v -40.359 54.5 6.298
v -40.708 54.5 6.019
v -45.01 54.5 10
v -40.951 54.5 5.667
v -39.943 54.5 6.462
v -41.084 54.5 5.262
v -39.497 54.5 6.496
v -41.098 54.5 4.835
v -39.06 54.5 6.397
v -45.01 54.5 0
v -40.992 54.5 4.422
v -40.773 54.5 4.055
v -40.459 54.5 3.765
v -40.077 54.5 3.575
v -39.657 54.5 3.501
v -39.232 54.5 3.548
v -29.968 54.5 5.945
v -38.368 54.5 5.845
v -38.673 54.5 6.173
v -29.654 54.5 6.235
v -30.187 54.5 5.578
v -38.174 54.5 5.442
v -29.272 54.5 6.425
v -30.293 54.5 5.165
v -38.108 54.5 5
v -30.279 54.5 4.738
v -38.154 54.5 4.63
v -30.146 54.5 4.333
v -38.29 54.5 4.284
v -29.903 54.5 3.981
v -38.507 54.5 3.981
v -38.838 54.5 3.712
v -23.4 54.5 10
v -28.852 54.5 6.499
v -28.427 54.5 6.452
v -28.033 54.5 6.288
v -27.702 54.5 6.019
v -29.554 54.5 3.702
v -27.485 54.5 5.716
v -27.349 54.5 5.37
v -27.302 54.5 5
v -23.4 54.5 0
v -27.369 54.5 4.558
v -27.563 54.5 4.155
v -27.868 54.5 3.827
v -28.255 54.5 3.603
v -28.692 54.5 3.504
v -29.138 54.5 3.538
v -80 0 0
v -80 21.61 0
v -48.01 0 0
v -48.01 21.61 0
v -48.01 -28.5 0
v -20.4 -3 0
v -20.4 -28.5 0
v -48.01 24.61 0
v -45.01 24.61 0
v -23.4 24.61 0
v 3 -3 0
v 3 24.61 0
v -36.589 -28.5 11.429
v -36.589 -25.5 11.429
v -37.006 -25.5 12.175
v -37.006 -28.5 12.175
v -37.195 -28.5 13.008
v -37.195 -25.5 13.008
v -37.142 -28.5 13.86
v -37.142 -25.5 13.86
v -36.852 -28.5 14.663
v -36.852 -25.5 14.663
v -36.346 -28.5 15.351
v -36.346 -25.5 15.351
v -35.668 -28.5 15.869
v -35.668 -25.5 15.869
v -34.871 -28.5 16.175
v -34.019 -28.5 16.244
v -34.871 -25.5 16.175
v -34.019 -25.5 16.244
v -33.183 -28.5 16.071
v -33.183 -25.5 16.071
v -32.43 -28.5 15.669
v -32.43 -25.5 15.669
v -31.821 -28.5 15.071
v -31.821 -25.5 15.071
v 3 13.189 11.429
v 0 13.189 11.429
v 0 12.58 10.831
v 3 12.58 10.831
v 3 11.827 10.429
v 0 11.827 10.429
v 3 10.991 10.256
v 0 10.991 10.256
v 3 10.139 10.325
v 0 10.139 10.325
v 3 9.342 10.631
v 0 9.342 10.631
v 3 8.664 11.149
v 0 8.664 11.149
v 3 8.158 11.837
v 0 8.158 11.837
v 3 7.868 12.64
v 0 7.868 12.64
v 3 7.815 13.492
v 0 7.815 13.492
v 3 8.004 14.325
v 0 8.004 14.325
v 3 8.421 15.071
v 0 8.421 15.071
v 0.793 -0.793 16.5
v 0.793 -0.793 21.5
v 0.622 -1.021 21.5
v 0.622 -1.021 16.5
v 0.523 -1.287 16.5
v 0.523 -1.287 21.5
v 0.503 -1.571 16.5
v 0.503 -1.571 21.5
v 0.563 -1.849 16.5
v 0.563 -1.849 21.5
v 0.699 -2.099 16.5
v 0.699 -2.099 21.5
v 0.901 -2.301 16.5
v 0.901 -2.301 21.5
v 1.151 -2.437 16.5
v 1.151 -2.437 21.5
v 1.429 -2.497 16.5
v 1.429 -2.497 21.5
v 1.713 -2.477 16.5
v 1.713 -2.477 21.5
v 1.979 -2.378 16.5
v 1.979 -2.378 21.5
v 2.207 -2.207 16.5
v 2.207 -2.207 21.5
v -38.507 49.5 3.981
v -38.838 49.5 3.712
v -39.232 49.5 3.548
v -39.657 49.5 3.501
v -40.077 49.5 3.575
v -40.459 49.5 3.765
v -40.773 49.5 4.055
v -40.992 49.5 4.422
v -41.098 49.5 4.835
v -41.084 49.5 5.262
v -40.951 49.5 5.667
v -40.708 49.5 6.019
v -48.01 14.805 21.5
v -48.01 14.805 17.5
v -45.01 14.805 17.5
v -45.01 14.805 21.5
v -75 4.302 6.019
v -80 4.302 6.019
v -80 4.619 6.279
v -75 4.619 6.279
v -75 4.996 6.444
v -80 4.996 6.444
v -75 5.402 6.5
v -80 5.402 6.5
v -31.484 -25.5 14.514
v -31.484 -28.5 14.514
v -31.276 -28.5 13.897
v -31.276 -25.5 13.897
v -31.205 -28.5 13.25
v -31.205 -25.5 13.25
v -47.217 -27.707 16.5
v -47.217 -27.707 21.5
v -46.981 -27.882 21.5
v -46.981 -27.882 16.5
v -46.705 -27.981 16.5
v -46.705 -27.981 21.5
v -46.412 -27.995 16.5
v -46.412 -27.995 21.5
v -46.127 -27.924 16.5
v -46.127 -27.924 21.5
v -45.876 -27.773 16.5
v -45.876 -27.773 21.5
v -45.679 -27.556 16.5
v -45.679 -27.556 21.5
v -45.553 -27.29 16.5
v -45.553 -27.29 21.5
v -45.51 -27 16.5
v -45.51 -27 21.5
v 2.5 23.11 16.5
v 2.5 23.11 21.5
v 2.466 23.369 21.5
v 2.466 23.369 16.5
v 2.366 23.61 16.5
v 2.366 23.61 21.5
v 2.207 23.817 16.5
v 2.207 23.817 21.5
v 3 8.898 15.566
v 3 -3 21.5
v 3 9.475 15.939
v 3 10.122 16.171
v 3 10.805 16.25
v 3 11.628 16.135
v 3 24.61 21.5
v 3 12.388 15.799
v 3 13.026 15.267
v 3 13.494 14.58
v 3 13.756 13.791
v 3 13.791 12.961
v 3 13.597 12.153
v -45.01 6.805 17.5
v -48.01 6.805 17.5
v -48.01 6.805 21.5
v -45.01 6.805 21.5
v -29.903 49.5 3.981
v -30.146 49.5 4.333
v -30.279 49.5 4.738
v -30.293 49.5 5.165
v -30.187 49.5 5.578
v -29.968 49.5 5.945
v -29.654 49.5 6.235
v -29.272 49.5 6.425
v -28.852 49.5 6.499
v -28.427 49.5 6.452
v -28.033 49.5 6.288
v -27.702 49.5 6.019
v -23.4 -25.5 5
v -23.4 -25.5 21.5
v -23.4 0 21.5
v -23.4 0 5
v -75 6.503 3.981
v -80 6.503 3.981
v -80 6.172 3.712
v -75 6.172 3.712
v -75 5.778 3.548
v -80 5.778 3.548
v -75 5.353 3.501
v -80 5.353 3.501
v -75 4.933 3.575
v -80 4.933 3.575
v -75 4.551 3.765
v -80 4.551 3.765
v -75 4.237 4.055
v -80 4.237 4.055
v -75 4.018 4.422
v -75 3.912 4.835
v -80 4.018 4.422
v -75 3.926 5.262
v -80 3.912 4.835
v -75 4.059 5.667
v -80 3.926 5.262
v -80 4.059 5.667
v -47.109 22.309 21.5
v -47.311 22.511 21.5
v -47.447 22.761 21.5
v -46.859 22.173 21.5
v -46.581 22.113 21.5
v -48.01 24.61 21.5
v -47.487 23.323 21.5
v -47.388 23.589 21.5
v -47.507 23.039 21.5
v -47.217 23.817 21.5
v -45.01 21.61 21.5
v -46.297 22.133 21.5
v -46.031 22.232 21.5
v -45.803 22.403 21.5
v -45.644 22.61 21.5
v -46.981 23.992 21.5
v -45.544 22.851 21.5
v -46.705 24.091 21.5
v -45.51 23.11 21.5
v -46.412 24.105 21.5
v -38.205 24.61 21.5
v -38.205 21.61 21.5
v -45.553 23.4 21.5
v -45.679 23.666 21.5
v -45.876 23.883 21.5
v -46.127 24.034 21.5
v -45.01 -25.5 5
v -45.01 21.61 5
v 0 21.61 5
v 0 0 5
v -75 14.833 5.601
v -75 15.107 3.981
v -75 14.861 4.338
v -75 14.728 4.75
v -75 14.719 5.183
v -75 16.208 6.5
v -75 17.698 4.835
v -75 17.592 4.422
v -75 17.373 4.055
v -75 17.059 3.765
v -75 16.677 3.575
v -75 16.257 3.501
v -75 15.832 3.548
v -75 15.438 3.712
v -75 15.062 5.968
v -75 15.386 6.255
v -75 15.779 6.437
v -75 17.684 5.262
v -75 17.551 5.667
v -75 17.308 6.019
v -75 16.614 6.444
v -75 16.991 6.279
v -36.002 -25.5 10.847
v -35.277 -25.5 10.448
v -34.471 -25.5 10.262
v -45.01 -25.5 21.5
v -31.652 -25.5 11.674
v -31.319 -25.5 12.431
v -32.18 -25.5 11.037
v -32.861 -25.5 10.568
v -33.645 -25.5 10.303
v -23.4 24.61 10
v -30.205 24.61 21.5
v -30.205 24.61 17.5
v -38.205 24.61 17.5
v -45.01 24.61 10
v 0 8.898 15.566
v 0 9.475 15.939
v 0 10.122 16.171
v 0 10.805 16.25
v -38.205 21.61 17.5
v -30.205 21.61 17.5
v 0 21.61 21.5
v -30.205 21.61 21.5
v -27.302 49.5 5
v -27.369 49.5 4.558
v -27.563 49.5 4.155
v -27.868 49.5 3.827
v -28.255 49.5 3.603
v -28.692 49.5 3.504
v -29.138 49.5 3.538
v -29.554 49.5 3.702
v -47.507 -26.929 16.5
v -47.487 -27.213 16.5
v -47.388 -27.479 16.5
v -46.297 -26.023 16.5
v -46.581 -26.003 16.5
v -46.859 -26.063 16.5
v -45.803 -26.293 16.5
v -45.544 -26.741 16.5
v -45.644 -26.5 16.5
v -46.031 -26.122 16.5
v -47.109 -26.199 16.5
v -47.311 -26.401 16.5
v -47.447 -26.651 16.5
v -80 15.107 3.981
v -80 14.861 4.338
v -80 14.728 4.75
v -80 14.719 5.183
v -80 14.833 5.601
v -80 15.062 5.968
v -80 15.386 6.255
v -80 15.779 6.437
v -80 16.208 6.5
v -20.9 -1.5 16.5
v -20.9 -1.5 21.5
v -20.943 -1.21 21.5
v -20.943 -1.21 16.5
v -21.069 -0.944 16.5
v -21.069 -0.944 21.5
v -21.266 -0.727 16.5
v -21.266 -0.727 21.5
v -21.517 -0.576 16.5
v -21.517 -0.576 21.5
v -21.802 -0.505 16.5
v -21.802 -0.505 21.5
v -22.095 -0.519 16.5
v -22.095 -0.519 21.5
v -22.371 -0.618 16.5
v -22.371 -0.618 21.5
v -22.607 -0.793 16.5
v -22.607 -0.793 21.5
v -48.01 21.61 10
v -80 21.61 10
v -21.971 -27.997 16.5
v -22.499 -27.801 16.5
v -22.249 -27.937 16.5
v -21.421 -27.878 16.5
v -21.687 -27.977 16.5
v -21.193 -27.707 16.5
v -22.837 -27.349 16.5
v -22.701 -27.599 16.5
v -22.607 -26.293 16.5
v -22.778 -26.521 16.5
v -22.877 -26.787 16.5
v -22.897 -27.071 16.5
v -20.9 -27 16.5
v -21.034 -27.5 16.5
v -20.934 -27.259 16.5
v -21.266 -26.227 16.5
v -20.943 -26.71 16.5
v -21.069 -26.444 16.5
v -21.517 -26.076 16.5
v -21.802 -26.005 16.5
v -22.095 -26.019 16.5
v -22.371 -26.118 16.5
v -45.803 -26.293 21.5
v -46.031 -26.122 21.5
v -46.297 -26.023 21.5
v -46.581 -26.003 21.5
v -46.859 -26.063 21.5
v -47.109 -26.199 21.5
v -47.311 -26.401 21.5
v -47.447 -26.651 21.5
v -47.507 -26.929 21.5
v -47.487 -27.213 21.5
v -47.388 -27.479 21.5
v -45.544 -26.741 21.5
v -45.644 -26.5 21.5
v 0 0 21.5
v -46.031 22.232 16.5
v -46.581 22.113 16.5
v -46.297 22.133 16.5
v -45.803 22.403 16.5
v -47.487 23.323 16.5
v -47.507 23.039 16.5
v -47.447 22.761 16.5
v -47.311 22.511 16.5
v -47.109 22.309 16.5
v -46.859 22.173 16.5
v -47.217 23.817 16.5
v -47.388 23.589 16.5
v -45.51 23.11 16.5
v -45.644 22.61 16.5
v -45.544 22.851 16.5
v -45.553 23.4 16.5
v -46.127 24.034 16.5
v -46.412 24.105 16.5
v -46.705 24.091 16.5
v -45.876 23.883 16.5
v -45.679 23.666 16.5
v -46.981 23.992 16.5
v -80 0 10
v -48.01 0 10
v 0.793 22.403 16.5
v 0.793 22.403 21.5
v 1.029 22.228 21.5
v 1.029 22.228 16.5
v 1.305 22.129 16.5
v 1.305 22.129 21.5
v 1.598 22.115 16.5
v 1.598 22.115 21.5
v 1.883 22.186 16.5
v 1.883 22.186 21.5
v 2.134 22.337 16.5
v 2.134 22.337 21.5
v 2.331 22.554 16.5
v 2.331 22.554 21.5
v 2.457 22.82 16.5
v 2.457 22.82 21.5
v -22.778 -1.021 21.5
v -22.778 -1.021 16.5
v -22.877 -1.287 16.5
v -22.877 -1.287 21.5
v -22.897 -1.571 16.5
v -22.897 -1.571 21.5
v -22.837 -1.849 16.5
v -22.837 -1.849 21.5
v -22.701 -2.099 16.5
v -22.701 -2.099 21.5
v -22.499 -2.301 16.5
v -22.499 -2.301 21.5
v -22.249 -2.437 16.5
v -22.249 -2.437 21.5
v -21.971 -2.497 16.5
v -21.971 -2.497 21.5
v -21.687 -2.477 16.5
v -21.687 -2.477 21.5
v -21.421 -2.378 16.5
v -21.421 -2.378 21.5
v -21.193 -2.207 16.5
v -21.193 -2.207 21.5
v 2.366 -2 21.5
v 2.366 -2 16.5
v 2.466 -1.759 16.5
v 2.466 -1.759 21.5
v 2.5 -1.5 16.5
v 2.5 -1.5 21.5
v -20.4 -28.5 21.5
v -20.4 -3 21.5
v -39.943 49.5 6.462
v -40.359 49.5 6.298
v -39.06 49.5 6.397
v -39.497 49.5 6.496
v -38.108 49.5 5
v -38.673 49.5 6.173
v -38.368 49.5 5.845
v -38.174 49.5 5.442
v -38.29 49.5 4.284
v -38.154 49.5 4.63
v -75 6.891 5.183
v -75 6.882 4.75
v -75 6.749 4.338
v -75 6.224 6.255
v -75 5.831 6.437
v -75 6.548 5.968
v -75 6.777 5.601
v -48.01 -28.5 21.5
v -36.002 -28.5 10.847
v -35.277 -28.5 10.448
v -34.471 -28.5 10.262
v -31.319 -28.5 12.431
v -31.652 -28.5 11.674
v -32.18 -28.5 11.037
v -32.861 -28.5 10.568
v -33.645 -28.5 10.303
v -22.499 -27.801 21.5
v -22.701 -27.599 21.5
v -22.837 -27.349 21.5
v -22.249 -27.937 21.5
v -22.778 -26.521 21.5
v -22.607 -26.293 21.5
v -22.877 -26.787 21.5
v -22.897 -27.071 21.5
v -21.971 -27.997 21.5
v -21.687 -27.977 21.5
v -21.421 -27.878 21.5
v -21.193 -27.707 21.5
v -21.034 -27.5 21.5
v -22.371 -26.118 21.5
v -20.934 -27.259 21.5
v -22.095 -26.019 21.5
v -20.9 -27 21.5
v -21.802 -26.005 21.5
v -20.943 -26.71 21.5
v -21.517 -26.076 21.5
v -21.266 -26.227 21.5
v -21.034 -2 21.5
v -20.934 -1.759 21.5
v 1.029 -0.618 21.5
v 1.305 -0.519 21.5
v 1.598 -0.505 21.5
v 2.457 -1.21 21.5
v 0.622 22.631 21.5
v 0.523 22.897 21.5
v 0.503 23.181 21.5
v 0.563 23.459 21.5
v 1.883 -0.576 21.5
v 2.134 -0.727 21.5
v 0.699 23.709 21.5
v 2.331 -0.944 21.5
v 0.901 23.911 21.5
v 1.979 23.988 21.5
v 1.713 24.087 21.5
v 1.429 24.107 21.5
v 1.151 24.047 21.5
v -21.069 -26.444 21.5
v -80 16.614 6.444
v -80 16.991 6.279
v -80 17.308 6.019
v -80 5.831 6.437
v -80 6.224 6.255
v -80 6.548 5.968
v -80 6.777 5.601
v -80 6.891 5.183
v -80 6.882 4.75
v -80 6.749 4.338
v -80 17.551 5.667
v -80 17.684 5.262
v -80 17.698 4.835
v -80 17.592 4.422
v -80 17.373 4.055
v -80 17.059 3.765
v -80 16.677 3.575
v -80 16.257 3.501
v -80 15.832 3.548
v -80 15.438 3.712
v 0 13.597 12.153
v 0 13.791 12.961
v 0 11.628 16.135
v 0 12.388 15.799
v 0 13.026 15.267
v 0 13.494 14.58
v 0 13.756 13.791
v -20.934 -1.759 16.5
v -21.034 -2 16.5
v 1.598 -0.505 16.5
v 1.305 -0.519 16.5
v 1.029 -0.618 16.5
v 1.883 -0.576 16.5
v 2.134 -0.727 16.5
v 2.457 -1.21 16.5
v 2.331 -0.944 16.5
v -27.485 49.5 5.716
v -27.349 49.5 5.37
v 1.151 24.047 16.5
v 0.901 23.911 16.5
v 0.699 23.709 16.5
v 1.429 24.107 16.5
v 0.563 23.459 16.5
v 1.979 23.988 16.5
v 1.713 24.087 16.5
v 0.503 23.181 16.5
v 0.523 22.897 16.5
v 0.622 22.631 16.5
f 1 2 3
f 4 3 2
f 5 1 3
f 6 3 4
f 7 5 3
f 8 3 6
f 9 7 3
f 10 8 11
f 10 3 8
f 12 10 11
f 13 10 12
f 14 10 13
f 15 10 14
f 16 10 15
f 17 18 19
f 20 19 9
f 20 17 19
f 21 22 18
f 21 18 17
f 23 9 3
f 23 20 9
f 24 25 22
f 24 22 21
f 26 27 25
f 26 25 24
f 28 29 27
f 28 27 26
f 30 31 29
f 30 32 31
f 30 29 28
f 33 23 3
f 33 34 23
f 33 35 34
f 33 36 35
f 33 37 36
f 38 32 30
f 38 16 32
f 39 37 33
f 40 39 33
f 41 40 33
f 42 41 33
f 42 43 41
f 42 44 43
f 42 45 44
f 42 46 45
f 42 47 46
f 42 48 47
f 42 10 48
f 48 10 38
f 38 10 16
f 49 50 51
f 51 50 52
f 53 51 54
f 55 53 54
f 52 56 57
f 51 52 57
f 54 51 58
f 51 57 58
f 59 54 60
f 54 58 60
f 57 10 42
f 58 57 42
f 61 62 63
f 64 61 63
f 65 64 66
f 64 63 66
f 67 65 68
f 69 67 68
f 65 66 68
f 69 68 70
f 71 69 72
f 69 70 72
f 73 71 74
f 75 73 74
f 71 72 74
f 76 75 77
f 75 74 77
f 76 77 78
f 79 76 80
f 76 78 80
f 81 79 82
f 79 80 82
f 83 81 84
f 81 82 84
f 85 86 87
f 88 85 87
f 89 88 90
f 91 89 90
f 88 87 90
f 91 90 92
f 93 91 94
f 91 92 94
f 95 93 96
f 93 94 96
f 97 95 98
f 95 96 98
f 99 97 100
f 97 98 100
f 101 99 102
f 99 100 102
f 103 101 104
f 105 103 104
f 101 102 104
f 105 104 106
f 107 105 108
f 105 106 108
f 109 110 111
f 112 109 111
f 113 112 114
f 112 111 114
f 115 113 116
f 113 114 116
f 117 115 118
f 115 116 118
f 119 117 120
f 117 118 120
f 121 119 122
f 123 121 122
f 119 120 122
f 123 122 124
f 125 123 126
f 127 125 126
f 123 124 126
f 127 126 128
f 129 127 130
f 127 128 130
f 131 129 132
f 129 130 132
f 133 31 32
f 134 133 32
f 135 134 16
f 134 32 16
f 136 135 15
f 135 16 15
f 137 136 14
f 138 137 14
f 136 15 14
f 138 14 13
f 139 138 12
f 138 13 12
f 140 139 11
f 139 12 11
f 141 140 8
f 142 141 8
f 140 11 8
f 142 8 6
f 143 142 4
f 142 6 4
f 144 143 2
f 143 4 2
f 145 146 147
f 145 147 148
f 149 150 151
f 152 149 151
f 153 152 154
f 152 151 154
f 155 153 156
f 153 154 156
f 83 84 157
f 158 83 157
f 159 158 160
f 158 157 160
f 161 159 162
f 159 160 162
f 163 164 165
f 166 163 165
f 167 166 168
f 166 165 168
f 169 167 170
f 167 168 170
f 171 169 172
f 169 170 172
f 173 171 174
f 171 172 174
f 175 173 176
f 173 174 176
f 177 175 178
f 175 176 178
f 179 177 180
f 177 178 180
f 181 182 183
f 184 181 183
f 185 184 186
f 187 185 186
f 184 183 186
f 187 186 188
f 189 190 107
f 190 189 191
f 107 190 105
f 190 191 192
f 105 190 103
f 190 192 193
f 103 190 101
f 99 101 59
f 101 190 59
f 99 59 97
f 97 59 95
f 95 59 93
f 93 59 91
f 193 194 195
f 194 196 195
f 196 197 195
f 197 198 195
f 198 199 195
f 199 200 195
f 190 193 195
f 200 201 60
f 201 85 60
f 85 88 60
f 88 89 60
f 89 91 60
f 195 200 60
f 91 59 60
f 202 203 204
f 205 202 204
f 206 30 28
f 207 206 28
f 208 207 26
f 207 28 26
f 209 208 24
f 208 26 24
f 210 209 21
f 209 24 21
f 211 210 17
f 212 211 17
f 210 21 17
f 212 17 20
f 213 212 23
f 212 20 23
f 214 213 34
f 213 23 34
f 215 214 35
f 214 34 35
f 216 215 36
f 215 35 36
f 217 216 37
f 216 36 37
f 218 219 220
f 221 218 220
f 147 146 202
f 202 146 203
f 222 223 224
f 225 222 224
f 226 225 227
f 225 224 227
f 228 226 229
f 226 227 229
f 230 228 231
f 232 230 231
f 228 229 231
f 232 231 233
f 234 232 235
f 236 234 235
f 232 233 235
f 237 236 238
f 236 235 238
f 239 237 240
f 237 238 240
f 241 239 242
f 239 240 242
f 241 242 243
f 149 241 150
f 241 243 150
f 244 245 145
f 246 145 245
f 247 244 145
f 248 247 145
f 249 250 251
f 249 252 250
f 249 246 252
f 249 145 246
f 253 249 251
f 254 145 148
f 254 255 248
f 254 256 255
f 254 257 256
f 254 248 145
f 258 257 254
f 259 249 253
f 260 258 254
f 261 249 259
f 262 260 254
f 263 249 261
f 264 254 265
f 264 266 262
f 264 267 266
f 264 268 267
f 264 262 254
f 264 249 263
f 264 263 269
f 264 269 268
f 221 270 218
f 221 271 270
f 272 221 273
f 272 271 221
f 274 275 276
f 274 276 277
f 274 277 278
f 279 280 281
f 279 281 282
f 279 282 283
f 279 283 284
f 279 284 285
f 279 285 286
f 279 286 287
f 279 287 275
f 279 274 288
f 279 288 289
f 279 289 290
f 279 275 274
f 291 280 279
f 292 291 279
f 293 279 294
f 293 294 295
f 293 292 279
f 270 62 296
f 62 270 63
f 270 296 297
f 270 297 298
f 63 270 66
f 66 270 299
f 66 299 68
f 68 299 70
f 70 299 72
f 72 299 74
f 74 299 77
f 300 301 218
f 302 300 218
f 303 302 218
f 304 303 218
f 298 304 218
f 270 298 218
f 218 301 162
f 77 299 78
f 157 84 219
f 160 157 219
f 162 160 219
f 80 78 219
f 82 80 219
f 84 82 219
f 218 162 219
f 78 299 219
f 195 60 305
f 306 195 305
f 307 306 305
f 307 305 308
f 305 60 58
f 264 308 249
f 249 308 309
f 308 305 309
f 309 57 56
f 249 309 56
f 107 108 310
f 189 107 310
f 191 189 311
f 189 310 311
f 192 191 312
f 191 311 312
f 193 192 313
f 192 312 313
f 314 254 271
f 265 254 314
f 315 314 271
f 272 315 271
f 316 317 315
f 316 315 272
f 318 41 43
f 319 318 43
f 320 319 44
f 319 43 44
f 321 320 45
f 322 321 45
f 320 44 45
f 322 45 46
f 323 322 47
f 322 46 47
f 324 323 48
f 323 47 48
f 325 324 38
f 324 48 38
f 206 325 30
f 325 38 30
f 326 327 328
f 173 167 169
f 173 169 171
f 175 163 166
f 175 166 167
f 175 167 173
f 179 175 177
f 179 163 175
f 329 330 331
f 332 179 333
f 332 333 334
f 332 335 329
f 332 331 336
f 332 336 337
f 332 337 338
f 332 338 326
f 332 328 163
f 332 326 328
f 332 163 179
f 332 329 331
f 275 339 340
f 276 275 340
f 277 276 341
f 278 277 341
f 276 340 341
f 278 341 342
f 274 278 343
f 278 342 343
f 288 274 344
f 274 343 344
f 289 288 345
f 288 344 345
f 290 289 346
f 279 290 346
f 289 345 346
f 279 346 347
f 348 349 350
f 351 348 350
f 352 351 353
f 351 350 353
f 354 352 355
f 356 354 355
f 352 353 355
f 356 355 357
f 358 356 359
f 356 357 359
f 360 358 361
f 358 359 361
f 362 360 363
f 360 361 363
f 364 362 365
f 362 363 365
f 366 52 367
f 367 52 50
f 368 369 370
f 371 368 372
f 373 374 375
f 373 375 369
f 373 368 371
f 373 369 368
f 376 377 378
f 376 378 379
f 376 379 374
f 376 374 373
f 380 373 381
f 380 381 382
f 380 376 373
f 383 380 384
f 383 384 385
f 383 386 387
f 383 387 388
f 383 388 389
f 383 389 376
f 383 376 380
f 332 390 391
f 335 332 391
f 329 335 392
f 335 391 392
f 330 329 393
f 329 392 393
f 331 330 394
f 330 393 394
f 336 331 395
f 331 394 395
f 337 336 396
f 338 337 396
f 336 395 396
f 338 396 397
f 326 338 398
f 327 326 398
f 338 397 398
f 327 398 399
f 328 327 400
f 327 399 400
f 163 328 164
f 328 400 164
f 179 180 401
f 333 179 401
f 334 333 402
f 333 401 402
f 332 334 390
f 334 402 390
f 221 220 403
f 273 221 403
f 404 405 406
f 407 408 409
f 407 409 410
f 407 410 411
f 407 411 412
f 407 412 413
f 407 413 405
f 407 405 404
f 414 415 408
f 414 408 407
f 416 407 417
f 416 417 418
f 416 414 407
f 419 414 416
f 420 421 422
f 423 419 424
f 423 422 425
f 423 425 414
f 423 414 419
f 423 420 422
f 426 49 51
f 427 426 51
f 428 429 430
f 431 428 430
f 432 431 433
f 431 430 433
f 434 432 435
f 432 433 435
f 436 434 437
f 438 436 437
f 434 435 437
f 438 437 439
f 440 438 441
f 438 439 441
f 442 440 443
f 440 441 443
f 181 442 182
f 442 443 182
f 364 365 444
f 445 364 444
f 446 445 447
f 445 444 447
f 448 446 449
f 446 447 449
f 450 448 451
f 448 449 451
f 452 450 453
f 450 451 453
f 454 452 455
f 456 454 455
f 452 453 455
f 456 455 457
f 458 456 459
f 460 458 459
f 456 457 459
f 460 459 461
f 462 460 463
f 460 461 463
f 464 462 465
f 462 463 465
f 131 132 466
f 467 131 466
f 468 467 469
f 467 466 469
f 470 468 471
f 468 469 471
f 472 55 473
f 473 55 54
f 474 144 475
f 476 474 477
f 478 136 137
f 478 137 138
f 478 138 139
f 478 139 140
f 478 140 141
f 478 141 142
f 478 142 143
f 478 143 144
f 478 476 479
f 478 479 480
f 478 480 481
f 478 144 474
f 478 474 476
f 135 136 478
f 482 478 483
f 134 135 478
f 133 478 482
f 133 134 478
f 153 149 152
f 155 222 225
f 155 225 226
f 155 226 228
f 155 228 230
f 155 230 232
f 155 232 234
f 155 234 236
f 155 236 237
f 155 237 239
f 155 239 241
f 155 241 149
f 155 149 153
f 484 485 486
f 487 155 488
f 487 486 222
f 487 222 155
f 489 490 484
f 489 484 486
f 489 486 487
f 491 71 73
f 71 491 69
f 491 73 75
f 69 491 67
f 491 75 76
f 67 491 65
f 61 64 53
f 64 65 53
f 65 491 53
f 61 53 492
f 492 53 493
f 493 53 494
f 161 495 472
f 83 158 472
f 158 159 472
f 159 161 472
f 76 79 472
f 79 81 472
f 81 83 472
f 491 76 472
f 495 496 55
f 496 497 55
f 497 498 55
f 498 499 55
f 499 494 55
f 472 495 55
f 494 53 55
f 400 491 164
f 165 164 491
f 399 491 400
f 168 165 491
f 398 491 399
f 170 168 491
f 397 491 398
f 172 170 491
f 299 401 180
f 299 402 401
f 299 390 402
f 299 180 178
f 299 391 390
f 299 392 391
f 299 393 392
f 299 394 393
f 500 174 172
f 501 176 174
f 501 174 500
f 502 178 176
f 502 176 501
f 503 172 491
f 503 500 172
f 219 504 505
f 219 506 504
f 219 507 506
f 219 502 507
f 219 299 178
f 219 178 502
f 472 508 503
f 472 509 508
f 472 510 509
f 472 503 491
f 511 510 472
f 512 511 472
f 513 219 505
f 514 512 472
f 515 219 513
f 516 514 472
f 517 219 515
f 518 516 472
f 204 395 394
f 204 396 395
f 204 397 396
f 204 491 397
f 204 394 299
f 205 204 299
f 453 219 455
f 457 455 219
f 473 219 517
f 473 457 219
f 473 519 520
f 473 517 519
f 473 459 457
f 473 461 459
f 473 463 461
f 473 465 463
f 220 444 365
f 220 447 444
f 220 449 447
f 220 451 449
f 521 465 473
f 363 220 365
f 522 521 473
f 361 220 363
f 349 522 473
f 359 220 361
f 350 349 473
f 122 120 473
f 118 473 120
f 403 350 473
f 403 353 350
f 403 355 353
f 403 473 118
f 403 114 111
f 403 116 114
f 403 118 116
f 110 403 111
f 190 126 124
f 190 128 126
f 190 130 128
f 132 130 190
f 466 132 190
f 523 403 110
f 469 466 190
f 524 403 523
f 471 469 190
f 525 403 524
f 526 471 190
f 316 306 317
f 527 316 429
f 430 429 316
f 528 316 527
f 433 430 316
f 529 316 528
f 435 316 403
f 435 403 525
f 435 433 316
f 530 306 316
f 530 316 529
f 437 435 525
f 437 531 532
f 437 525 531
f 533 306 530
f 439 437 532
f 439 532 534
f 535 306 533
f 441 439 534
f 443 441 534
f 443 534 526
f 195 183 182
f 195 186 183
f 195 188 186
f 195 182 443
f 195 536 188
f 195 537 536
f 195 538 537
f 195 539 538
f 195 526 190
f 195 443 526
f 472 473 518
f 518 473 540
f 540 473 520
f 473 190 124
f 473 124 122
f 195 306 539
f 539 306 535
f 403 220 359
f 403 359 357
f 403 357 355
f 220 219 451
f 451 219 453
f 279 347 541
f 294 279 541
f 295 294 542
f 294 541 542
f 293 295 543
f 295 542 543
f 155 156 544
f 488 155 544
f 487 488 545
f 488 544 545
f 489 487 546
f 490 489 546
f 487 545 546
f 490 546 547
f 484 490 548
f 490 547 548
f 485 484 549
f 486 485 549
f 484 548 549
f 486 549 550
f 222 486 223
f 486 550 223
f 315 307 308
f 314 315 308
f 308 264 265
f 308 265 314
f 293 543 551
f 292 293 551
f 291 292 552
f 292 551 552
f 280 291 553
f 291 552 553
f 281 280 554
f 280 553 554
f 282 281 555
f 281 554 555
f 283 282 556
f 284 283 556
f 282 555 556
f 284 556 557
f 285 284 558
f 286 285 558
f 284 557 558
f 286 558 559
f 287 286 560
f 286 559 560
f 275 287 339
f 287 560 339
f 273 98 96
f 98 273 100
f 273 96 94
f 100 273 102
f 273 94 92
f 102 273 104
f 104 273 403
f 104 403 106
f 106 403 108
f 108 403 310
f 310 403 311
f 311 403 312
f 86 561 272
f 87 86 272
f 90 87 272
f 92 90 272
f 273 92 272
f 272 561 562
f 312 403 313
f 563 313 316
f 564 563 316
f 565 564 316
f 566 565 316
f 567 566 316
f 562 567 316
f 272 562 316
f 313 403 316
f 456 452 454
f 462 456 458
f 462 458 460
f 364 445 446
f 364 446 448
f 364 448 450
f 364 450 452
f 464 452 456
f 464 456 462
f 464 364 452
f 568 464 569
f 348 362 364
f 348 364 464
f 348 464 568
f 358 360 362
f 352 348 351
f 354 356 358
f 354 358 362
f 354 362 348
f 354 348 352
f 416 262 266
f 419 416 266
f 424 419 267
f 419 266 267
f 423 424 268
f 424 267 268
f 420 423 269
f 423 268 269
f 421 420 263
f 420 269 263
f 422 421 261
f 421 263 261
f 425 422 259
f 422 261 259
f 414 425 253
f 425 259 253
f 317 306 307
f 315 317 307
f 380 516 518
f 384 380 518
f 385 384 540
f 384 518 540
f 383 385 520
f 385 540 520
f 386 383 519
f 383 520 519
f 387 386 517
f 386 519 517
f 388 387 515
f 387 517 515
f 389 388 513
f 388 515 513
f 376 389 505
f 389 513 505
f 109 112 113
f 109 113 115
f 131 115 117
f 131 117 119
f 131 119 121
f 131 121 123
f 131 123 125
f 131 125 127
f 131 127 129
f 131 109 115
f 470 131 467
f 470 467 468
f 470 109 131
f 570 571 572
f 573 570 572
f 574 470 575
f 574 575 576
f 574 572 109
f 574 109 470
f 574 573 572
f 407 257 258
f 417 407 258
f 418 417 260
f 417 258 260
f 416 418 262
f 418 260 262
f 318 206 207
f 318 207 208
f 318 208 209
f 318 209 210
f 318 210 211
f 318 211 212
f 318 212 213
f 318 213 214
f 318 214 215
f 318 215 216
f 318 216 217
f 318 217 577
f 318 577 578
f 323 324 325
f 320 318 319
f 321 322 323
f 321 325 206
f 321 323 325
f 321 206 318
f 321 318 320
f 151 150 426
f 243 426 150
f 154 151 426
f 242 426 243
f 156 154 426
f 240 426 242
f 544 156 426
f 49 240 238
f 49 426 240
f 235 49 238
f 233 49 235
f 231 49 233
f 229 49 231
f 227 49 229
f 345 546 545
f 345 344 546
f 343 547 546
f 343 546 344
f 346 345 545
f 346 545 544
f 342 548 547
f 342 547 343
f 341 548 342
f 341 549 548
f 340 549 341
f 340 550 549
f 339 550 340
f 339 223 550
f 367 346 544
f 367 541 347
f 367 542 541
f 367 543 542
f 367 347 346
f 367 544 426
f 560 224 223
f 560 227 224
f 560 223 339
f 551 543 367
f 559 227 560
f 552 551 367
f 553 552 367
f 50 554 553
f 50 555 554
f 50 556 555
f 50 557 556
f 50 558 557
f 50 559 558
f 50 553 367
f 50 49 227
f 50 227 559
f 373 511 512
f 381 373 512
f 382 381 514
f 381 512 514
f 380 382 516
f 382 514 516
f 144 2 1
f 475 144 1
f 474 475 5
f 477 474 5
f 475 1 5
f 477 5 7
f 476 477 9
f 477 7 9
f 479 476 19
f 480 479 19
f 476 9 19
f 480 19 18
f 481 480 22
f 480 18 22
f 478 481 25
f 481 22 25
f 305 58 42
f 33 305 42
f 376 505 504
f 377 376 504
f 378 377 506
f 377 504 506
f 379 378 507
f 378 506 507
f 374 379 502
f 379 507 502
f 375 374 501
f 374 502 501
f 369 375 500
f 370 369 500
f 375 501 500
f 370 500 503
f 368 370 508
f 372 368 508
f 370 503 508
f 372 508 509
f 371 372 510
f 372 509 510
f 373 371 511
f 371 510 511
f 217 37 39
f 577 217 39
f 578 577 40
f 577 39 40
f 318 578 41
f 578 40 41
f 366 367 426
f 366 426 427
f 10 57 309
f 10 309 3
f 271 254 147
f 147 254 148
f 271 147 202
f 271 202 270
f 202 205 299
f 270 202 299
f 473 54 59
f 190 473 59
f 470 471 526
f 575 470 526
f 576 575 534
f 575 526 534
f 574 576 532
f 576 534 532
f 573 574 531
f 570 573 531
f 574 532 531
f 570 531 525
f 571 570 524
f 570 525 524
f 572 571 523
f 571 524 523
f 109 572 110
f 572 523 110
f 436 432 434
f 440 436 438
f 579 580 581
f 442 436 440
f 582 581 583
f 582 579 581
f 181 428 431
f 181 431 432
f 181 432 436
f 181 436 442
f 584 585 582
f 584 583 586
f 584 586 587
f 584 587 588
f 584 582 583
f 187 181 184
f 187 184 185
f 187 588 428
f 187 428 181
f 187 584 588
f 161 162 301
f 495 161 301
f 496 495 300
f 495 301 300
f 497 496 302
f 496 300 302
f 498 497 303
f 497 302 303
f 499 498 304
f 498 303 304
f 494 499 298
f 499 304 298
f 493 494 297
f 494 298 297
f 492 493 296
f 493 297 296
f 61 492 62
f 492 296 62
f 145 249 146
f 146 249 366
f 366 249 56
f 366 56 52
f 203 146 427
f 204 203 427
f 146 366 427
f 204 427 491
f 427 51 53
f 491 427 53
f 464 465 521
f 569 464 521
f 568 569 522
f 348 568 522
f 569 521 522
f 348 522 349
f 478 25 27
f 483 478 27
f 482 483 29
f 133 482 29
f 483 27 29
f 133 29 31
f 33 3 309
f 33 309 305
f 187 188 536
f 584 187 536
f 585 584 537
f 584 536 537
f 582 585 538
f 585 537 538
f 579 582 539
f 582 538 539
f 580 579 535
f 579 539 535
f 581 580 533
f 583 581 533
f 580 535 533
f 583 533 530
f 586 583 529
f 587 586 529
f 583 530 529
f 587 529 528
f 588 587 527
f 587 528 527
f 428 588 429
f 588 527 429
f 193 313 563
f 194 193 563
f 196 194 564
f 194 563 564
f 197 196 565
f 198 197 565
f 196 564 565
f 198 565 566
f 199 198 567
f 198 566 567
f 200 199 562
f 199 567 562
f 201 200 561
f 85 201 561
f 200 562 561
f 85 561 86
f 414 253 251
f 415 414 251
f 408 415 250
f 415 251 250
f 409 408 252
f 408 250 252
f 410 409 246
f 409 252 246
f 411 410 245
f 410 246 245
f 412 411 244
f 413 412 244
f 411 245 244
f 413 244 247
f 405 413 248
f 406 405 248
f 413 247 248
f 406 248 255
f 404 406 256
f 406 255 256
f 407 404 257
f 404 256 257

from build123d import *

# Parameters (mm, degrees)
ESQUISSE1_W              = 31.99
ESQUISSE1_H              = 21.61
ESQUISSE1_W_2            = 3
ESQUISSE1_H_2            = 3
ESQUISSE1_W_3            = 21.61
ESQUISSE1_H_3            = 29.89
ESQUISSE1_H_4            = 25.5
BOSS_EXTRU_1_DEPTH       = 26.5
ESQUISSE2_W              = 21.61
ESQUISSE2_H              = 25.5
ESQUISSE2_W_2            = 45.01
ESQUISSE2_H_2            = 21.61
ENL_V_MAT_EXTRU_1_DEPTH  = 21.5
ESQUISSE3_W              = 52.98097293
ESQUISSE3_H              = 57.792843893
ENL_V_MAT_EXTRU_2_DEPTH  = 5
ENL_V_MAT_EXTRU_3_DEPTH  = 5
ESQUISSE5_W              = 31.99
ESQUISSE5_H              = 21.61
ESQUISSE5_W_2            = 21.61
ESQUISSE5_H_2            = 29.89
ENL_V_MAT_EXTRU_4_DEPTH  = 16.5
ENL_V_MAT_EXTRU_5_DEPTH  = 16.5
ENL_V_MAT_EXTRU_6_DEPTH  = 16.5
ESQUISSE8_W              = 4
ESQUISSE8_H              = 4
ENL_V_MAT_EXTRU_7_DEPTH  = 16.5
ESQUISSE9_W              = 4
ESQUISSE9_H              = 4
ENL_V_MAT_EXTRU_8_DEPTH  = 16.5
ENL_V_MAT_EXTRU_9_DEPTH  = 5
ENL_V_MAT_EXTRU_10_DEPTH = 5


with BuildPart() as part:
    # Esquisse1 → Boss.-Extru.1 (new body)
    with BuildSketch(Plane.XY):
        with Locations((-64.005, 10.805)):
            Rectangle(ESQUISSE1_W, ESQUISSE1_H)
        Polygon((-23.4, 0), (0, 0), (0, 21.61), (-23.4, 21.61), (-45.01, 21.61), (-48.01, 21.61), (-48.01, 0), (-45.01, 0), align=None)
        with Locations((-46.51, 23.11)):
            Rectangle(ESQUISSE1_W_2, ESQUISSE1_H_2)
        with Locations((-34.205, 23.11)):
            Rectangle(ESQUISSE1_W_3, ESQUISSE1_H_2)
        with Locations((-34.205, 39.555)):
            Rectangle(ESQUISSE1_W_3, ESQUISSE1_H_3)
        Polygon((0, 21.61), (0, 0), (-23.4, 0), (-23.4, -25.5), (-45.01, -25.5), (-45.01, 0), (-48.01, 0), (-48.01, -28.5), (-20.4, -28.5), (-20.4, -3), (3, -3), (3, 24.61), (-23.4, 24.61), (-23.4, 21.61), align=None)
        with Locations((-34.205, -12.75)):
            Rectangle(ESQUISSE1_W_3, ESQUISSE1_H_4)
    extrude(amount=BOSS_EXTRU_1_DEPTH)

    # Esquisse2 → Enlèv. mat.-Extru.1 (cut)
    with BuildSketch(Plane.XY.offset(26.5)):
        with Locations((-34.205, -12.75)):
            Rectangle(ESQUISSE2_W, ESQUISSE2_H)
        with Locations((-22.505, 10.805)):
            Rectangle(ESQUISSE2_W_2, ESQUISSE2_H_2)
    extrude(amount=-ENL_V_MAT_EXTRU_1_DEPTH, mode=Mode.SUBTRACT)

    # Esquisse3 → Enlèv. mat.-Extru.2 (cut)
    with BuildSketch(Plane.XY.offset(26.5)):
        with Locations((-21.519513535, -4.286421947)):
            Rectangle(ESQUISSE3_W, ESQUISSE3_H)
    extrude(amount=-ENL_V_MAT_EXTRU_2_DEPTH, mode=Mode.SUBTRACT)

    # Esquisse4 → Enlèv. mat.-Extru.3 (cut)
    with BuildSketch(Plane.XY.offset(21.5)):
        with BuildLine():
            ThreePointArc((-20.9, -27), (-21.517316568, -26.076120467), (-22.607106781, -26.292893219))
            Line((-22.607106781, -26.292893219), (-21.192893219, -27.707106781))
            ThreePointArc((-21.192893219, -27.707106781), (-20.976120467, -27.382683432), (-20.9, -27))
        make_face()
        with BuildLine():
            Line((-21.192893219, -27.707106781), (-22.607106781, -26.292893219))
            ThreePointArc((-22.607106781, -26.292893219), (-22.607106781, -27.707106781), (-21.192893219, -27.707106781))
        make_face()
        with BuildLine():
            ThreePointArc((-45.51, -27), (-45.586120467, -26.617316568), (-45.802893219, -26.292893219))
            Line((-45.802893219, -26.292893219), (-47.217106781, -27.707106781))
            ThreePointArc((-47.217106781, -27.707106781), (-46.127316568, -27.923879533), (-45.51, -27))
        make_face()
        with BuildLine():
            Line((-47.217106781, -27.707106781), (-45.802893219, -26.292893219))
            ThreePointArc((-45.802893219, -26.292893219), (-47.217106781, -26.292893219), (-47.217106781, -27.707106781))
        make_face()
        with BuildLine():
            ThreePointArc((-45.51, 23.11), (-46.127316568, 24.033879533), (-47.217106781, 23.817106781))
            Line((-47.217106781, 23.817106781), (-45.802893219, 22.402893219))
            ThreePointArc((-45.802893219, 22.402893219), (-45.586120467, 22.727316568), (-45.51, 23.11))
        make_face()
        with BuildLine():
            Line((-45.802893219, 22.402893219), (-47.217106781, 23.817106781))
            ThreePointArc((-47.217106781, 23.817106781), (-47.217106781, 22.402893219), (-45.802893219, 22.402893219))
        make_face()
        with BuildLine():
            ThreePointArc((2.5, 23.11), (2.423879533, 23.492683432), (2.207106781, 23.817106781))
            Line((2.207106781, 23.817106781), (0.792893219, 22.402893219))
            ThreePointArc((0.792893219, 22.402893219), (1.882683432, 22.186120467), (2.5, 23.11))
        make_face()
        with BuildLine():
            Line((0.792893219, 22.402893219), (2.207106781, 23.817106781))
            ThreePointArc((2.207106781, 23.817106781), (0.792893219, 23.817106781), (0.792893219, 22.402893219))
        make_face()
        with BuildLine():
            ThreePointArc((0.792893219, -0.792893219), (0.792893219, -2.207106781), (2.207106781, -2.207106781))
            Line((2.207106781, -2.207106781), (0.792893219, -0.792893219))
        make_face()
        with BuildLine():
            Line((0.792893219, -0.792893219), (2.207106781, -2.207106781))
            ThreePointArc((2.207106781, -2.207106781), (2.423879533, -1.882683432), (2.5, -1.5))
            ThreePointArc((2.5, -1.5), (1.882683432, -0.576120467), (0.792893219, -0.792893219))
        make_face()
        with BuildLine():
            ThreePointArc((-20.9, -1.5), (-21.517316568, -0.576120467), (-22.607106781, -0.792893219))
            Line((-22.607106781, -0.792893219), (-21.192893219, -2.207106781))
            ThreePointArc((-21.192893219, -2.207106781), (-20.976120467, -1.882683432), (-20.9, -1.5))
        make_face()
        with BuildLine():
            Line((-21.192893219, -2.207106781), (-22.607106781, -0.792893219))
            ThreePointArc((-22.607106781, -0.792893219), (-22.607106781, -2.207106781), (-21.192893219, -2.207106781))
        make_face()
    extrude(amount=-ENL_V_MAT_EXTRU_3_DEPTH, mode=Mode.SUBTRACT)

    # Esquisse5 → Enlèv. mat.-Extru.4 (cut)
    with BuildSketch(Plane.XY.offset(26.5)):
        with Locations((-64.005, 10.805)):
            Rectangle(ESQUISSE5_W, ESQUISSE5_H)
        with Locations((-34.205, 39.555)):
            Rectangle(ESQUISSE5_W_2, ESQUISSE5_H_2)
    extrude(amount=-ENL_V_MAT_EXTRU_4_DEPTH, mode=Mode.SUBTRACT)

    # Esquisse6 → Enlèv. mat.-Extru.5 (cut)
    with BuildSketch(Plane.ZY):
        with BuildLine():
            ThreePointArc((16.25, 10.805), (14.580081534, 13.494030144), (11.429411258, 13.189419559))
            Line((11.429411258, 13.189419559), (15.070588742, 8.420580441))
            ThreePointArc((15.070588742, 8.420580441), (15.939030144, 9.474918466), (16.25, 10.805))
        make_face()
        with BuildLine():
            Line((15.070588742, 8.420580441), (11.429411258, 13.189419559))
            ThreePointArc((11.429411258, 13.189419559), (10.865580441, 8.984411258), (15.070588742, 8.420580441))
        make_face()
    extrude(amount=-ENL_V_MAT_EXTRU_5_DEPTH, mode=Mode.SUBTRACT)

    # Esquisse7 → Enlèv. mat.-Extru.6 (cut)
    with BuildSketch(Plane(origin=(0, -25.5, 0), x_dir=(1, 0, 0), z_dir=(0, 1, 0))):
        with BuildLine():
            ThreePointArc((-31.205, -13.25), (-33.244078223, -10.408058879), (-36.589419559, -11.429411258))
            Line((-36.589419559, -11.429411258), (-31.820580441, -15.070588742))
            ThreePointArc((-31.820580441, -15.070588742), (-31.363058879, -14.210921777), (-31.205, -13.25))
        make_face()
        with BuildLine():
            Line((-31.820580441, -15.070588742), (-36.589419559, -11.429411258))
            ThreePointArc((-36.589419559, -11.429411258), (-36.025588742, -15.634419559), (-31.820580441, -15.070588742))
        make_face()
    extrude(amount=-ENL_V_MAT_EXTRU_6_DEPTH, mode=Mode.SUBTRACT)

    # Esquisse8 → Enlèv. mat.-Extru.7 (cut)
    with BuildSketch(Plane(origin=(0, 24.61, 0), x_dir=(1, 0, 0), z_dir=(0, 1, 0))):
        with Locations((-32.205, -19.5)):
            Rectangle(ESQUISSE8_W, ESQUISSE8_H)
        with Locations((-36.205, -19.5)):
            Rectangle(ESQUISSE8_W, ESQUISSE8_H)
    extrude(amount=-ENL_V_MAT_EXTRU_7_DEPTH, mode=Mode.SUBTRACT)

    # Esquisse9 → Enlèv. mat.-Extru.8 (cut)
    with BuildSketch(Plane.ZY.offset(48.01)):
        with Locations((19.5, 8.805)):
            Rectangle(ESQUISSE9_W, ESQUISSE9_H)
        with Locations((19.5, 12.805)):
            Rectangle(ESQUISSE9_W, ESQUISSE9_H)
    extrude(amount=-ENL_V_MAT_EXTRU_8_DEPTH, mode=Mode.SUBTRACT)

    # Esquisse10 → Enlèv. mat.-Extru.9 (cut)
    with BuildSketch(Plane.ZY.offset(80)):
        with BuildLine():
            ThreePointArc((6.5, 16.2075), (6.374461183, 16.80821329), (6.018858058, 17.308376132))
            Line((6.018858058, 17.308376132), (3.981141942, 15.106623868))
            ThreePointArc((3.981141942, 15.106623868), (5.60071329, 14.833038817), (6.5, 16.2075))
        make_face()
        with BuildLine():
            Line((3.981141942, 15.106623868), (6.018858058, 17.308376132))
            ThreePointArc((6.018858058, 17.308376132), (3.899123868, 17.226358058), (3.981141942, 15.106623868))
        make_face()
        with BuildLine():
            ThreePointArc((6.5, 5.4025), (5.60071329, 6.776961183), (3.981141942, 6.503376132))
            Line((3.981141942, 6.503376132), (6.018858058, 4.301623868))
            ThreePointArc((6.018858058, 4.301623868), (6.374461183, 4.80178671), (6.5, 5.4025))
        make_face()
        with BuildLine():
            Line((6.018858058, 4.301623868), (3.981141942, 6.503376132))
            ThreePointArc((3.981141942, 6.503376132), (3.899123868, 4.383641942), (6.018858058, 4.301623868))
        make_face()
    extrude(amount=-ENL_V_MAT_EXTRU_9_DEPTH, mode=Mode.SUBTRACT)

    # Esquisse11 → Enlèv. mat.-Extru.10 (cut)
    with BuildSketch(Plane(origin=(0, 54.5, 0), x_dir=(1, 0, 0), z_dir=(0, 1, 0))):
        with BuildLine():
            ThreePointArc((-29.903376132, -3.981141942), (-29.821358058, -6.100876132), (-27.701623868, -6.018858058))
            Line((-27.701623868, -6.018858058), (-29.903376132, -3.981141942))
        make_face()
        with BuildLine():
            Line((-29.903376132, -3.981141942), (-27.701623868, -6.018858058))
            ThreePointArc((-27.701623868, -6.018858058), (-27.405840736, -5.547122382), (-27.3025, -5))
            ThreePointArc((-27.3025, -5), (-28.255377618, -3.603340736), (-29.903376132, -3.981141942))
        make_face()
        with BuildLine():
            ThreePointArc((-38.1075, -5), (-38.210840736, -4.452877618), (-38.506623868, -3.981141942))
            Line((-38.506623868, -3.981141942), (-40.708376132, -6.018858058))
            ThreePointArc((-40.708376132, -6.018858058), (-39.060377618, -6.396659264), (-38.1075, -5))
        make_face()
        with BuildLine():
            Line((-40.708376132, -6.018858058), (-38.506623868, -3.981141942))
            ThreePointArc((-38.506623868, -3.981141942), (-40.626358058, -3.899123868), (-40.708376132, -6.018858058))
        make_face()
    extrude(amount=-ENL_V_MAT_EXTRU_10_DEPTH, mode=Mode.SUBTRACT)


solid = part.part
